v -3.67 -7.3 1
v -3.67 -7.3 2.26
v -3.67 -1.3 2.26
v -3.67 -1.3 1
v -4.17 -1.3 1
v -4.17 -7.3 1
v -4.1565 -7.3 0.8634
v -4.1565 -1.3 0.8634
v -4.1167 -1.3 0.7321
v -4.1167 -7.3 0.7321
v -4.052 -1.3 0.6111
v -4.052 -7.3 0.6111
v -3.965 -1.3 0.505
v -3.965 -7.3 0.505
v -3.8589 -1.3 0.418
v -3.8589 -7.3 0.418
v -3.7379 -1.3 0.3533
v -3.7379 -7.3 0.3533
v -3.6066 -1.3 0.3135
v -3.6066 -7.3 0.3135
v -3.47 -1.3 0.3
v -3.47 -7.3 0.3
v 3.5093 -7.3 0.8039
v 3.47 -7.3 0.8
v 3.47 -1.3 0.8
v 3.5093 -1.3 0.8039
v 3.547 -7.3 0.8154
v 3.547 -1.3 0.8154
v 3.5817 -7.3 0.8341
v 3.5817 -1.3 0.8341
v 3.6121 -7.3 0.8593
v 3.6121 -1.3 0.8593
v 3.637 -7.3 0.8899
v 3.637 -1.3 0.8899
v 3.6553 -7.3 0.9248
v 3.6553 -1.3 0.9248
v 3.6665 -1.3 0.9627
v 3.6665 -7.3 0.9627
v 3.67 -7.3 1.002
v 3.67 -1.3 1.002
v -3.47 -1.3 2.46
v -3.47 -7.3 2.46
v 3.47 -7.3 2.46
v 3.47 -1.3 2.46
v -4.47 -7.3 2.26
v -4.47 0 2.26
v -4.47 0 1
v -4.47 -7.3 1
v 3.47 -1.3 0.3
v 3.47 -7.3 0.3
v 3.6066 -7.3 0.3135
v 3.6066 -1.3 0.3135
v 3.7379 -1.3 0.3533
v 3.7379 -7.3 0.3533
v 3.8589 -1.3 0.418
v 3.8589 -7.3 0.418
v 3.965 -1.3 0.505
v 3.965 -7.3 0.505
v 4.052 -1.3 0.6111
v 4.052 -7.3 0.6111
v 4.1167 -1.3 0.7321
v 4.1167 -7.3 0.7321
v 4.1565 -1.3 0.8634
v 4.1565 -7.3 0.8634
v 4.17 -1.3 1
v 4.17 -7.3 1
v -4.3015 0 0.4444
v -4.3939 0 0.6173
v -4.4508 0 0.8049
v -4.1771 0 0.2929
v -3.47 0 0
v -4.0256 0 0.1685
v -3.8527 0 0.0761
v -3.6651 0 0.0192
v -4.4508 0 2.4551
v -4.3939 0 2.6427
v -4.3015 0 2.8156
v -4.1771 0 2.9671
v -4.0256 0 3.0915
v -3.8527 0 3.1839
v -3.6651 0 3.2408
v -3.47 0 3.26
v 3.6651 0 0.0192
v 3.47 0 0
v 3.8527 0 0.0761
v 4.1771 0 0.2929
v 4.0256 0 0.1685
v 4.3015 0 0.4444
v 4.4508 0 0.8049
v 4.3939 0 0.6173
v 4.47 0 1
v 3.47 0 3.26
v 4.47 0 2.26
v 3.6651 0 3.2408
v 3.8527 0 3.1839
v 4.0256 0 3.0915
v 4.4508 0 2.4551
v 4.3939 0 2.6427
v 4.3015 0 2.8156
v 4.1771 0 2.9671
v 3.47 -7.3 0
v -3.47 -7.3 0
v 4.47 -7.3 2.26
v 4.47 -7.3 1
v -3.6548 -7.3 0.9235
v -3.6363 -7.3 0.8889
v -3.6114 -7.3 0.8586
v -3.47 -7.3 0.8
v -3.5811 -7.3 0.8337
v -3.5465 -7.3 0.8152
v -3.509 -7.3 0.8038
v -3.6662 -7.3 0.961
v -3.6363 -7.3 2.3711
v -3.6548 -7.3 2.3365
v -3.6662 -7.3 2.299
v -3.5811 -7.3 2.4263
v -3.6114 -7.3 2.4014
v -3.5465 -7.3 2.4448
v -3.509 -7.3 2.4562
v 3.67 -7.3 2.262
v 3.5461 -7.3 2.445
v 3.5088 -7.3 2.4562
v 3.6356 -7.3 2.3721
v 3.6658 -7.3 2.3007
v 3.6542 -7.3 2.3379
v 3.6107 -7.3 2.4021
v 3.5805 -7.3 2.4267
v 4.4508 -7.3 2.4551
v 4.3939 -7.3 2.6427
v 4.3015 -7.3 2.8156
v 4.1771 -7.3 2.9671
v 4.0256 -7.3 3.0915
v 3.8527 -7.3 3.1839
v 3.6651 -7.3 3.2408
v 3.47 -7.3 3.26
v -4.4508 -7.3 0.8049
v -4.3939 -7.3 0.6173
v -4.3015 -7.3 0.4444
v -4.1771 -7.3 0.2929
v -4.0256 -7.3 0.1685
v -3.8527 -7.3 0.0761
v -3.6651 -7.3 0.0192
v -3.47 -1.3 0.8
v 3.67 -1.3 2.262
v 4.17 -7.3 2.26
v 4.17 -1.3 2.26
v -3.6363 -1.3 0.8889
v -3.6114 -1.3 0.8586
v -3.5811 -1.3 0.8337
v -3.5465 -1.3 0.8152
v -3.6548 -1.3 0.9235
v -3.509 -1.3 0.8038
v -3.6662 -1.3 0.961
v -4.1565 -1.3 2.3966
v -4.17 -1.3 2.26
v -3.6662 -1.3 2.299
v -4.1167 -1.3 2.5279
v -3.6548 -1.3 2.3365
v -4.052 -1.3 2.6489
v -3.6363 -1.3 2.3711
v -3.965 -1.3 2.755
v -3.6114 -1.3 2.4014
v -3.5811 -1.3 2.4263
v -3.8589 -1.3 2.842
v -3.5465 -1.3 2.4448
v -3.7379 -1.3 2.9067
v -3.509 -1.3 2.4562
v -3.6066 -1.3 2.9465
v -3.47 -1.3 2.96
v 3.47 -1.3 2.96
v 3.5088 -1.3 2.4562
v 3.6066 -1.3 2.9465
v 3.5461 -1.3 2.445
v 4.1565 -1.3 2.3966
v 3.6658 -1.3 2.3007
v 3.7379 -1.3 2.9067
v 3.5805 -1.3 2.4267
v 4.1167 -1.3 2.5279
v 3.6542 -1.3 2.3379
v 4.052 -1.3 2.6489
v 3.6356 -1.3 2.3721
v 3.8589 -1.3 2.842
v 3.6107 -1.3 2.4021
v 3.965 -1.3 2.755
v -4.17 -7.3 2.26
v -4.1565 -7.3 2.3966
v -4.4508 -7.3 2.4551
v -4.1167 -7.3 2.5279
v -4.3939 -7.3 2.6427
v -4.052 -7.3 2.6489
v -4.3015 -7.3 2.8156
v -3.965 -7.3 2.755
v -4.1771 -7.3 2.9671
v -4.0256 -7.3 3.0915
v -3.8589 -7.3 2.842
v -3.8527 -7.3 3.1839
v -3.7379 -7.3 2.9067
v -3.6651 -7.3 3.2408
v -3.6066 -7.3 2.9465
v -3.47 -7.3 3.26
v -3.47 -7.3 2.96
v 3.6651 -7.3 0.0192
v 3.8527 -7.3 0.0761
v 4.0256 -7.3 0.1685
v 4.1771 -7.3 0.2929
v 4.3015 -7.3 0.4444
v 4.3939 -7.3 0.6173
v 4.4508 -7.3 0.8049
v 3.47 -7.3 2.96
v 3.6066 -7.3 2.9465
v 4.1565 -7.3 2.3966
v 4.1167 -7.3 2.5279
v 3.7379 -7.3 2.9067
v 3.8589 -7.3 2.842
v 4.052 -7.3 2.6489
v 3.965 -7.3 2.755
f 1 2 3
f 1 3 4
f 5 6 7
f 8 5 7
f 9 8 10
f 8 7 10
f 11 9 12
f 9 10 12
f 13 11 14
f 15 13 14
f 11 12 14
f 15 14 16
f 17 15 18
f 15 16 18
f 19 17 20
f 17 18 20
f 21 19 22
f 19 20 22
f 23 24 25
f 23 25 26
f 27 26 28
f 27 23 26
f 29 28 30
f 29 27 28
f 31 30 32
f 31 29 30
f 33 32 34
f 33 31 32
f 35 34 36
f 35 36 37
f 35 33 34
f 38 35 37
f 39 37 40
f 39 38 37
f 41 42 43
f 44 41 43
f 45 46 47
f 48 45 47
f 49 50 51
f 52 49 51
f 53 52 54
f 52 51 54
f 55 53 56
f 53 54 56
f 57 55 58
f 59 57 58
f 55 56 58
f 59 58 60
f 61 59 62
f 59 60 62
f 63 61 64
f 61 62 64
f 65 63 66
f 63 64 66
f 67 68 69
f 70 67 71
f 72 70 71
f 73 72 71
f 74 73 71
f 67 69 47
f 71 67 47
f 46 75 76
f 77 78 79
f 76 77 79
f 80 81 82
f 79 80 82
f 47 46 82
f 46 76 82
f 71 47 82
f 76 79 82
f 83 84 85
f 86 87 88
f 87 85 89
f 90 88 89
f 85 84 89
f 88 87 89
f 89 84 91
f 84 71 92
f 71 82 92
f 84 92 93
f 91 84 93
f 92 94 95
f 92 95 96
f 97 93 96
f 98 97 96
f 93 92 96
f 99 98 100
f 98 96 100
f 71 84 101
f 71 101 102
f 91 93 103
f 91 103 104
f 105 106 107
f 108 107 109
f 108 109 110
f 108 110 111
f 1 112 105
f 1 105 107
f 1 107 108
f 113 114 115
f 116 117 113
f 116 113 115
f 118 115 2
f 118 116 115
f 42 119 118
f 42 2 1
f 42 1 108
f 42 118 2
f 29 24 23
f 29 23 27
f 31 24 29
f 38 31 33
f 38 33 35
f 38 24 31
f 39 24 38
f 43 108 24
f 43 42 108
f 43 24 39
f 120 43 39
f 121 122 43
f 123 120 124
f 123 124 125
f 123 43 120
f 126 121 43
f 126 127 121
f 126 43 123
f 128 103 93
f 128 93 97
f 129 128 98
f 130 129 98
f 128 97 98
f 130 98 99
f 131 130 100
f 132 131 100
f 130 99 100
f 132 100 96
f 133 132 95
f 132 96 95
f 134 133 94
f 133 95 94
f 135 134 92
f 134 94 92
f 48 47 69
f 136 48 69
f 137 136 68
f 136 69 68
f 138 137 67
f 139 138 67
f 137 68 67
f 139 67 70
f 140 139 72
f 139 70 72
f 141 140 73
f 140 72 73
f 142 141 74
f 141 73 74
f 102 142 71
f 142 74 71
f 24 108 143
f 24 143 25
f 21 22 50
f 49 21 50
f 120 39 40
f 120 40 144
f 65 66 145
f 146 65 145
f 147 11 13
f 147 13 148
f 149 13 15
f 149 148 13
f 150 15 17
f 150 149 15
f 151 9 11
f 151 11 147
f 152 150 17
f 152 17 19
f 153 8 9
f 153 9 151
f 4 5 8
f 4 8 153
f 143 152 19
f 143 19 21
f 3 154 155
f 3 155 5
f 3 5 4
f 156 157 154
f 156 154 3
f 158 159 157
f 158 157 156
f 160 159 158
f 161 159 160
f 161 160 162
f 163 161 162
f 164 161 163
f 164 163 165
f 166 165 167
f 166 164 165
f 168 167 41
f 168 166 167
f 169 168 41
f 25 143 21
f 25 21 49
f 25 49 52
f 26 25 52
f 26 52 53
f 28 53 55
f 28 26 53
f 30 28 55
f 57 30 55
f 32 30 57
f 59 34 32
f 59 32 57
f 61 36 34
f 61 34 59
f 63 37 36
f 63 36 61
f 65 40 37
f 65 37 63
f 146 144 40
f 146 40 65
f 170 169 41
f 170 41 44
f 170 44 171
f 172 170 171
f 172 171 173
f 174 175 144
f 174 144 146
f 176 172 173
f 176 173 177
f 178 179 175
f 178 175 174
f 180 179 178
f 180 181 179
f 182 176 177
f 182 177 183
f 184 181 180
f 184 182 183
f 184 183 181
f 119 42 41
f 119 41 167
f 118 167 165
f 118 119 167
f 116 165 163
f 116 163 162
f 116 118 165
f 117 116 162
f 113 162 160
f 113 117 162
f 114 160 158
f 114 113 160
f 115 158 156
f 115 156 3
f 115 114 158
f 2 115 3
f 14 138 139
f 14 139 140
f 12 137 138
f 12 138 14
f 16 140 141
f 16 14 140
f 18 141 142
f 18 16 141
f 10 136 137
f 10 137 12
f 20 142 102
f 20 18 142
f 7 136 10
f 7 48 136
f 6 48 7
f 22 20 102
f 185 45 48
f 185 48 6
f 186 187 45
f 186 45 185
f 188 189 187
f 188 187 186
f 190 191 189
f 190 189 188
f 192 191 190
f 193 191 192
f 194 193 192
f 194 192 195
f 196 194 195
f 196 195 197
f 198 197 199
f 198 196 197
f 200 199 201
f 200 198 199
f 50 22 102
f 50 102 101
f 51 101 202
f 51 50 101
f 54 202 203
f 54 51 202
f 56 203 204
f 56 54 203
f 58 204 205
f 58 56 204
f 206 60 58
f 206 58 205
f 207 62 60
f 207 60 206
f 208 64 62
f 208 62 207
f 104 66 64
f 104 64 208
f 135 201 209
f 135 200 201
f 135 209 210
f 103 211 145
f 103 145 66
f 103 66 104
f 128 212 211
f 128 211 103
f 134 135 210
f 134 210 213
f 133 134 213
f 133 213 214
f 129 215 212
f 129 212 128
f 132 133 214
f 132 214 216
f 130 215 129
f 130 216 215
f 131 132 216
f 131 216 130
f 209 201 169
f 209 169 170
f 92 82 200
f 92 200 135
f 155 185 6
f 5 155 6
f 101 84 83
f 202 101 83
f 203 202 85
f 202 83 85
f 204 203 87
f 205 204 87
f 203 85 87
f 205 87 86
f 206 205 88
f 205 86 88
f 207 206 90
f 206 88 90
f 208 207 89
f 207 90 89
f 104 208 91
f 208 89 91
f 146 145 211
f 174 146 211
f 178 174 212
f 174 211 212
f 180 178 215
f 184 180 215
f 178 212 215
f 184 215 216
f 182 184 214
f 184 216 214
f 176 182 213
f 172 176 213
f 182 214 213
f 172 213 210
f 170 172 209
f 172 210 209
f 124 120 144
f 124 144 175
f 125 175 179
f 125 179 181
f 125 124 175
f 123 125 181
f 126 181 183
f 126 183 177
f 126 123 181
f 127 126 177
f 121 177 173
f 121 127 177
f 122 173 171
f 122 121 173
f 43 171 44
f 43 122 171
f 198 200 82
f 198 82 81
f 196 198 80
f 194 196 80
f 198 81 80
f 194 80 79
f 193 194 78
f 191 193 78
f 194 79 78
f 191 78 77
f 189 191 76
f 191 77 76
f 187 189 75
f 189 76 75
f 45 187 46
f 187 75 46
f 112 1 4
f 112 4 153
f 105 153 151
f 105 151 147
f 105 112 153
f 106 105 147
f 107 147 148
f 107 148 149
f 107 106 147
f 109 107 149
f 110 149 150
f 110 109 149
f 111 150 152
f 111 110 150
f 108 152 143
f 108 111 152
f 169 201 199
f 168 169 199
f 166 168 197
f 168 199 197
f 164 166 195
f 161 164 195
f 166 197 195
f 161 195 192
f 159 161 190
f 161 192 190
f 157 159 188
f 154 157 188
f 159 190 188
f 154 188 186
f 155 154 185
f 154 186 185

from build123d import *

# Parameters (mm, degrees)
PAD_DEPTH    = 7.3
POCKET_DEPTH = 6


with BuildPart() as part:
    # Sketch → Pad (new body)
    with BuildSketch(Plane.XZ):
        with BuildLine():
            ThreePointArc((-3.47, 3.26), (-4.177107, 2.967107), (-4.47, 2.26))
            Line((-4.47, 2.26), (-4.47, 1))
            ThreePointArc((-4.47, 1), (-4.177107, 0.292893), (-3.47, 0))
            Line((3.47, 0), (-3.47, 0))
            ThreePointArc((3.47, 0), (4.177107, 0.292893), (4.47, 1))
            Line((4.47, 2.26), (4.47, 1))
            ThreePointArc((4.47, 2.26), (4.177107, 2.967107), (3.47, 3.26))
            Line((-3.47, 3.26), (3.47, 3.26))
        make_face()
    extrude(amount=PAD_DEPTH)

    # Sketch001 (on Face10 of Pad) → Pocket (cut)
    with BuildSketch(Plane.XZ.offset(7.3)):
        with BuildLine():
            ThreePointArc((-3.47, 2.96), (-3.964975, 2.754975), (-4.17, 2.26))
            Line((-4.17, 2.26), (-4.17, 1))
            ThreePointArc((-4.17, 1), (-3.964975, 0.505025), (-3.47, 0.3))
            Line((-3.47, 0.3), (3.47, 0.3))
            ThreePointArc((3.47, 0.3), (3.964975, 0.505025), (4.17, 1))
            Line((4.17, 1), (4.17, 2.26))
            ThreePointArc((4.17, 2.26), (3.964975, 2.754975), (3.47, 2.96))
            Line((-3.47, 2.96), (3.47, 2.96))
        make_face()
        with BuildLine():
            ThreePointArc((-3.47, 2.46), (-3.611421, 2.401421), (-3.67, 2.26))
            Line((-3.67, 2.26), (-3.67, 1))
            ThreePointArc((-3.67, 1), (-3.611421, 0.858579), (-3.47, 0.8))
            Line((-3.47, 0.8), (3.47, 0.8))
            ThreePointArc((3.47, 0.8), (3.61212, 0.859281), (3.66999, 1.001982))
            Line((3.66999, 1.001982), (3.66999, 2.261982))
            ThreePointArc((3.66999, 2.261982), (3.610719, 2.40212), (3.47, 2.46))
            Line((-3.47, 2.46), (3.47, 2.46))
        make_face(mode=Mode.SUBTRACT)
    extrude(amount=-POCKET_DEPTH, mode=Mode.SUBTRACT)


solid = part.part
